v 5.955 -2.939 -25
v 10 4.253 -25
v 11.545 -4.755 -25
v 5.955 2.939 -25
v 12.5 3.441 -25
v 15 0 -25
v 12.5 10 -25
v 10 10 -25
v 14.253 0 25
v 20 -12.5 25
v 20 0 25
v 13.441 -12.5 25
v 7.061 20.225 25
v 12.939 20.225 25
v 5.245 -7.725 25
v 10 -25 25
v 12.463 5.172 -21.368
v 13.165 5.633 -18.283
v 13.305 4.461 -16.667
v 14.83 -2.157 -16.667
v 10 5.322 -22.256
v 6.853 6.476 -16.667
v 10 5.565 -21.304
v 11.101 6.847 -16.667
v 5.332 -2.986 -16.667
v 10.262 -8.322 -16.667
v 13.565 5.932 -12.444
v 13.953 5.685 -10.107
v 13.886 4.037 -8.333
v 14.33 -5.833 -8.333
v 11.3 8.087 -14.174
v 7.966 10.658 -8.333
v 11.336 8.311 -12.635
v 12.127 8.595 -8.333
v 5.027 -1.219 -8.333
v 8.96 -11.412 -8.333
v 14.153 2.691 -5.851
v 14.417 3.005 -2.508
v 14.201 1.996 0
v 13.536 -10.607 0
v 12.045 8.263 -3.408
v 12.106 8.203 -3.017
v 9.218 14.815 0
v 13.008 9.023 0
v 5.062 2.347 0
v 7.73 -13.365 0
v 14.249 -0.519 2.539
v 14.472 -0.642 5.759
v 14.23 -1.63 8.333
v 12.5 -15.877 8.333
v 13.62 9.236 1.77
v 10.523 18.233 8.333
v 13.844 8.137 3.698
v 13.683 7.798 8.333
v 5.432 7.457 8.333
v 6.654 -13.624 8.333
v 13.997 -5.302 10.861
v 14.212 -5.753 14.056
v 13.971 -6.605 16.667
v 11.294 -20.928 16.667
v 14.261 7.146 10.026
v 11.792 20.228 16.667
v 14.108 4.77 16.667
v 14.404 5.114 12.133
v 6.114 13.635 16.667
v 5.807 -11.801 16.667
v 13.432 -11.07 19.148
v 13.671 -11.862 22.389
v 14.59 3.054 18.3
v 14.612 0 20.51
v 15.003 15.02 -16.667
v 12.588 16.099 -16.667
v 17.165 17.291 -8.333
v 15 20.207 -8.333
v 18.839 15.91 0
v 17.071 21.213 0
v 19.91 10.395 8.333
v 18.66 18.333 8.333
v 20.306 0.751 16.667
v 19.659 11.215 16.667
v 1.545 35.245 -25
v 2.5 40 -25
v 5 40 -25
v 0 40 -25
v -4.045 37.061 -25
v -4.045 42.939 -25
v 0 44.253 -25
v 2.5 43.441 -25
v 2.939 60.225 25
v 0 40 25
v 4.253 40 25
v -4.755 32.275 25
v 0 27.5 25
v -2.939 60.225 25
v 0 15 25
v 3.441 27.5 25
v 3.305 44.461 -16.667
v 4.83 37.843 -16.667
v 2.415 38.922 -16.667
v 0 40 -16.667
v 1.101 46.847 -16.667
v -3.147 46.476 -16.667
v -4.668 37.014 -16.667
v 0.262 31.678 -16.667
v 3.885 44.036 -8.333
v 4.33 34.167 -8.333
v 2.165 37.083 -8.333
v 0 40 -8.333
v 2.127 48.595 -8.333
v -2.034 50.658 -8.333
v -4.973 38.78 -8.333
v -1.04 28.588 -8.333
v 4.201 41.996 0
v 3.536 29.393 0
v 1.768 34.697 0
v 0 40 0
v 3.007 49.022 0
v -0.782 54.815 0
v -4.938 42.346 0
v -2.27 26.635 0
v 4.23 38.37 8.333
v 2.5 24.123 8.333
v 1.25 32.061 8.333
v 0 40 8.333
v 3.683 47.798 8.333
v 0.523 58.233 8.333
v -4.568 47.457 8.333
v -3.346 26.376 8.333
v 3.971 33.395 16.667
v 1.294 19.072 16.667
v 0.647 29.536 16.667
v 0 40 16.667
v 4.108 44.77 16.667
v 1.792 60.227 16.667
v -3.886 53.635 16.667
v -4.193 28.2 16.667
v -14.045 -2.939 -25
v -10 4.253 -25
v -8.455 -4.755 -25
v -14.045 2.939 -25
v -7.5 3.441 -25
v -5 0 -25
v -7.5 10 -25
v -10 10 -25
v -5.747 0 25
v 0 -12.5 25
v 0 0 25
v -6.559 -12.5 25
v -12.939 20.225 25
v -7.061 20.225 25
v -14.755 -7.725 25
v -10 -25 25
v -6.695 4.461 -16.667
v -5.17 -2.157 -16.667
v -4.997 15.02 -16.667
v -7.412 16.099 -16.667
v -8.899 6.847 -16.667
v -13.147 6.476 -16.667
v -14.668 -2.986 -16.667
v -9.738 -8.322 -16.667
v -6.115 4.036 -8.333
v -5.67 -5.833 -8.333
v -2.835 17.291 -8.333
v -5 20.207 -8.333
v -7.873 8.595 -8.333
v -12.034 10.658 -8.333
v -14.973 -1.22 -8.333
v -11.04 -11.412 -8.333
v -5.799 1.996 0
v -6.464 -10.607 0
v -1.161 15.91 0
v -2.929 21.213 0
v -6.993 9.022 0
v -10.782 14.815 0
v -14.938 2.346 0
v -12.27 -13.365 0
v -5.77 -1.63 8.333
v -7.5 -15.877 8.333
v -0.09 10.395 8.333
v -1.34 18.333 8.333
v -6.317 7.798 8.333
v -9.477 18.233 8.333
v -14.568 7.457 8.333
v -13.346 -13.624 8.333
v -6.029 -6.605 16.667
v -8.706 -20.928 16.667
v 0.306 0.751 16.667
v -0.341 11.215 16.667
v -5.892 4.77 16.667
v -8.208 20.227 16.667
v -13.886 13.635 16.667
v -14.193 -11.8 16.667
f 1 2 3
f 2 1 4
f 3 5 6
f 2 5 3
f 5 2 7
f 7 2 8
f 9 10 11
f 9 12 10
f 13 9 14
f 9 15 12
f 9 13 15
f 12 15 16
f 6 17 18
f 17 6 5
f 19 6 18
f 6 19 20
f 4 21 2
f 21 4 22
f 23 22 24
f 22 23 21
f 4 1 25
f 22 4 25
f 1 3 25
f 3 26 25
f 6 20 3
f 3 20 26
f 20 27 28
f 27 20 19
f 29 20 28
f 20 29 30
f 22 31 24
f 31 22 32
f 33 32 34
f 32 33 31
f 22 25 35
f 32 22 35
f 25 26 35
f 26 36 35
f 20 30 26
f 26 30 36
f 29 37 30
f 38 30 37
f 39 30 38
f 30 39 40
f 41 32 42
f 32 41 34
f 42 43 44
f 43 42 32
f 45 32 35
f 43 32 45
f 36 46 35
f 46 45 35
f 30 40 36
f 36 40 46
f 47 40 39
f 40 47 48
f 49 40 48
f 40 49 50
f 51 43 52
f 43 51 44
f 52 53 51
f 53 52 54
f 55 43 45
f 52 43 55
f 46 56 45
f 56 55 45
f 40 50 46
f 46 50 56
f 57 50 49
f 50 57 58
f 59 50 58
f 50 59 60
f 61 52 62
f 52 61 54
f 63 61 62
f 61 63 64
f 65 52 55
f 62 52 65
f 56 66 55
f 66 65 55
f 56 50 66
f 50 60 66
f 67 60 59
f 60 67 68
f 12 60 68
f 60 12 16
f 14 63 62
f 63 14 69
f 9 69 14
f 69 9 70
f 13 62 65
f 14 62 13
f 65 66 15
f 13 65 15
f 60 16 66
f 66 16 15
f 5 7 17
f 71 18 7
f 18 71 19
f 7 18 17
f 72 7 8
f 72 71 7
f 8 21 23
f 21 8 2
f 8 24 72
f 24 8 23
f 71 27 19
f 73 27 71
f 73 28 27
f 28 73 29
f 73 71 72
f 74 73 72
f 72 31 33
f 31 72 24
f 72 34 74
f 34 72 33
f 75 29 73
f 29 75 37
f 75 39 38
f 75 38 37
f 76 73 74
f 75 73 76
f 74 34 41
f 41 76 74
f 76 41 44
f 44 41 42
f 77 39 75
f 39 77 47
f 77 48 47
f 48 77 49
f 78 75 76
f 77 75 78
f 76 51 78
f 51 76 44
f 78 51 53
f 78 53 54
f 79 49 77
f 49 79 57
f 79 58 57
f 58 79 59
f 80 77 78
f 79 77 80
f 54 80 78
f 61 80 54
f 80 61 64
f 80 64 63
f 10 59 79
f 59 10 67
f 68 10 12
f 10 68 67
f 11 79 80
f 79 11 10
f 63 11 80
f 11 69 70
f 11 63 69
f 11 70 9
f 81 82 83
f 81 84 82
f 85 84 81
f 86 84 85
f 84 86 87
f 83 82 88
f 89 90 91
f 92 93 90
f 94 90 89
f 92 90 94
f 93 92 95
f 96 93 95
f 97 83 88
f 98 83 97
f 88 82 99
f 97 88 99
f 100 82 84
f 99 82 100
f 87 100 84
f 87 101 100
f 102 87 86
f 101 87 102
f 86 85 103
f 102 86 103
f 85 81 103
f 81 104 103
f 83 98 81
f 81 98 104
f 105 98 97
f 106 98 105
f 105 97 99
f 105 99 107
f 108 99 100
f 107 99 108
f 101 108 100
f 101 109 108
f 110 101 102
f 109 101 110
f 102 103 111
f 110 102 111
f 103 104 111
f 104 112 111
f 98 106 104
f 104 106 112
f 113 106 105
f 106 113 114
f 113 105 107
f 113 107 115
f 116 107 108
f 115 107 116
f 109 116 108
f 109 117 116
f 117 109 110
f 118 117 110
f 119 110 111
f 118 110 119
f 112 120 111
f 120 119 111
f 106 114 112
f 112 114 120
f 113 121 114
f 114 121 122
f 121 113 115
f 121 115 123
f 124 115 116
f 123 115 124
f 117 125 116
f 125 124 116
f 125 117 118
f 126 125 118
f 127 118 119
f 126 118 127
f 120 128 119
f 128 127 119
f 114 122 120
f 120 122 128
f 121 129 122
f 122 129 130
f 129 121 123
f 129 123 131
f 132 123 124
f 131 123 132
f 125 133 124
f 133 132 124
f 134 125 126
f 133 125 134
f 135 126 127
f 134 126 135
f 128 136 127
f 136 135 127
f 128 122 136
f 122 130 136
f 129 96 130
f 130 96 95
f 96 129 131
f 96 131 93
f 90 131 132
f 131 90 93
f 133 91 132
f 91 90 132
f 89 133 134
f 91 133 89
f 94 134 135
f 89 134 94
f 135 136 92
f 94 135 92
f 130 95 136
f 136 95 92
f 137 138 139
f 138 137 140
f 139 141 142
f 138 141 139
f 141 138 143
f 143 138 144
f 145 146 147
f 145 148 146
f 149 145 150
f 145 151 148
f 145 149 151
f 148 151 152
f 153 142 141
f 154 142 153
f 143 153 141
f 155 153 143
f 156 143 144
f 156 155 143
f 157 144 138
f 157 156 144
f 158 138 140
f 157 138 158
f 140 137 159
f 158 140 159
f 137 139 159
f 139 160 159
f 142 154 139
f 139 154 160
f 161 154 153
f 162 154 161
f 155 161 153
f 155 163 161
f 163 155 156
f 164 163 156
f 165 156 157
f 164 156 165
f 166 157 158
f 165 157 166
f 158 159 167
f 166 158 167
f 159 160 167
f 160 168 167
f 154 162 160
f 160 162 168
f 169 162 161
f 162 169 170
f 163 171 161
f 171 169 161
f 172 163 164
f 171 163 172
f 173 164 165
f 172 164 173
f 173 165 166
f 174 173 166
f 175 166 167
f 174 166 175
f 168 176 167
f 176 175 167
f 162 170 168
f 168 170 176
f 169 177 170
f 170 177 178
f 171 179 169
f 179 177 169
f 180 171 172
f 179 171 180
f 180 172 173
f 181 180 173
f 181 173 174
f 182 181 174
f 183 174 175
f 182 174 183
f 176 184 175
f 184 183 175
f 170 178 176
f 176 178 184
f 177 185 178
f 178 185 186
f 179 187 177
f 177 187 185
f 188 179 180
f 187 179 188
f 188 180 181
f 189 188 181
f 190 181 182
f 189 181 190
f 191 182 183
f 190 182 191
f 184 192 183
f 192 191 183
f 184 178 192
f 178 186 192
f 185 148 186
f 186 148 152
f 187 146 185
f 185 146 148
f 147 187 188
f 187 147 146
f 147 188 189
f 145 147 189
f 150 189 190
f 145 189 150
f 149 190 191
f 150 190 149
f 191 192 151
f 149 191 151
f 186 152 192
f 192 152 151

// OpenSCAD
scale(5) {
  translate([0,8,0]) {
    linear_extrude(height = 10, center = true, scale=[1,5], twist=90) {
      difference() {
        circle(r = 1);
        square([0.5, 2]);
      }
    }
  }
  translate([-2,0,0]) {
    linear_extrude(height = 10, center = true, scale=[1,5], twist=90) {
      circle(r = 1);
      color("red")
        square([0.5, 2]);
    }
  }
  translate([+2,0,0]) {
    linear_extrude(height = 10, center = true, scale=[1,5], twist=90) {
      circle(r = 1);
    }
    linear_extrude(height = 10, center = true, scale=[1,5], twist=90) {
      square([0.5, 2]);
    }
  }
}
